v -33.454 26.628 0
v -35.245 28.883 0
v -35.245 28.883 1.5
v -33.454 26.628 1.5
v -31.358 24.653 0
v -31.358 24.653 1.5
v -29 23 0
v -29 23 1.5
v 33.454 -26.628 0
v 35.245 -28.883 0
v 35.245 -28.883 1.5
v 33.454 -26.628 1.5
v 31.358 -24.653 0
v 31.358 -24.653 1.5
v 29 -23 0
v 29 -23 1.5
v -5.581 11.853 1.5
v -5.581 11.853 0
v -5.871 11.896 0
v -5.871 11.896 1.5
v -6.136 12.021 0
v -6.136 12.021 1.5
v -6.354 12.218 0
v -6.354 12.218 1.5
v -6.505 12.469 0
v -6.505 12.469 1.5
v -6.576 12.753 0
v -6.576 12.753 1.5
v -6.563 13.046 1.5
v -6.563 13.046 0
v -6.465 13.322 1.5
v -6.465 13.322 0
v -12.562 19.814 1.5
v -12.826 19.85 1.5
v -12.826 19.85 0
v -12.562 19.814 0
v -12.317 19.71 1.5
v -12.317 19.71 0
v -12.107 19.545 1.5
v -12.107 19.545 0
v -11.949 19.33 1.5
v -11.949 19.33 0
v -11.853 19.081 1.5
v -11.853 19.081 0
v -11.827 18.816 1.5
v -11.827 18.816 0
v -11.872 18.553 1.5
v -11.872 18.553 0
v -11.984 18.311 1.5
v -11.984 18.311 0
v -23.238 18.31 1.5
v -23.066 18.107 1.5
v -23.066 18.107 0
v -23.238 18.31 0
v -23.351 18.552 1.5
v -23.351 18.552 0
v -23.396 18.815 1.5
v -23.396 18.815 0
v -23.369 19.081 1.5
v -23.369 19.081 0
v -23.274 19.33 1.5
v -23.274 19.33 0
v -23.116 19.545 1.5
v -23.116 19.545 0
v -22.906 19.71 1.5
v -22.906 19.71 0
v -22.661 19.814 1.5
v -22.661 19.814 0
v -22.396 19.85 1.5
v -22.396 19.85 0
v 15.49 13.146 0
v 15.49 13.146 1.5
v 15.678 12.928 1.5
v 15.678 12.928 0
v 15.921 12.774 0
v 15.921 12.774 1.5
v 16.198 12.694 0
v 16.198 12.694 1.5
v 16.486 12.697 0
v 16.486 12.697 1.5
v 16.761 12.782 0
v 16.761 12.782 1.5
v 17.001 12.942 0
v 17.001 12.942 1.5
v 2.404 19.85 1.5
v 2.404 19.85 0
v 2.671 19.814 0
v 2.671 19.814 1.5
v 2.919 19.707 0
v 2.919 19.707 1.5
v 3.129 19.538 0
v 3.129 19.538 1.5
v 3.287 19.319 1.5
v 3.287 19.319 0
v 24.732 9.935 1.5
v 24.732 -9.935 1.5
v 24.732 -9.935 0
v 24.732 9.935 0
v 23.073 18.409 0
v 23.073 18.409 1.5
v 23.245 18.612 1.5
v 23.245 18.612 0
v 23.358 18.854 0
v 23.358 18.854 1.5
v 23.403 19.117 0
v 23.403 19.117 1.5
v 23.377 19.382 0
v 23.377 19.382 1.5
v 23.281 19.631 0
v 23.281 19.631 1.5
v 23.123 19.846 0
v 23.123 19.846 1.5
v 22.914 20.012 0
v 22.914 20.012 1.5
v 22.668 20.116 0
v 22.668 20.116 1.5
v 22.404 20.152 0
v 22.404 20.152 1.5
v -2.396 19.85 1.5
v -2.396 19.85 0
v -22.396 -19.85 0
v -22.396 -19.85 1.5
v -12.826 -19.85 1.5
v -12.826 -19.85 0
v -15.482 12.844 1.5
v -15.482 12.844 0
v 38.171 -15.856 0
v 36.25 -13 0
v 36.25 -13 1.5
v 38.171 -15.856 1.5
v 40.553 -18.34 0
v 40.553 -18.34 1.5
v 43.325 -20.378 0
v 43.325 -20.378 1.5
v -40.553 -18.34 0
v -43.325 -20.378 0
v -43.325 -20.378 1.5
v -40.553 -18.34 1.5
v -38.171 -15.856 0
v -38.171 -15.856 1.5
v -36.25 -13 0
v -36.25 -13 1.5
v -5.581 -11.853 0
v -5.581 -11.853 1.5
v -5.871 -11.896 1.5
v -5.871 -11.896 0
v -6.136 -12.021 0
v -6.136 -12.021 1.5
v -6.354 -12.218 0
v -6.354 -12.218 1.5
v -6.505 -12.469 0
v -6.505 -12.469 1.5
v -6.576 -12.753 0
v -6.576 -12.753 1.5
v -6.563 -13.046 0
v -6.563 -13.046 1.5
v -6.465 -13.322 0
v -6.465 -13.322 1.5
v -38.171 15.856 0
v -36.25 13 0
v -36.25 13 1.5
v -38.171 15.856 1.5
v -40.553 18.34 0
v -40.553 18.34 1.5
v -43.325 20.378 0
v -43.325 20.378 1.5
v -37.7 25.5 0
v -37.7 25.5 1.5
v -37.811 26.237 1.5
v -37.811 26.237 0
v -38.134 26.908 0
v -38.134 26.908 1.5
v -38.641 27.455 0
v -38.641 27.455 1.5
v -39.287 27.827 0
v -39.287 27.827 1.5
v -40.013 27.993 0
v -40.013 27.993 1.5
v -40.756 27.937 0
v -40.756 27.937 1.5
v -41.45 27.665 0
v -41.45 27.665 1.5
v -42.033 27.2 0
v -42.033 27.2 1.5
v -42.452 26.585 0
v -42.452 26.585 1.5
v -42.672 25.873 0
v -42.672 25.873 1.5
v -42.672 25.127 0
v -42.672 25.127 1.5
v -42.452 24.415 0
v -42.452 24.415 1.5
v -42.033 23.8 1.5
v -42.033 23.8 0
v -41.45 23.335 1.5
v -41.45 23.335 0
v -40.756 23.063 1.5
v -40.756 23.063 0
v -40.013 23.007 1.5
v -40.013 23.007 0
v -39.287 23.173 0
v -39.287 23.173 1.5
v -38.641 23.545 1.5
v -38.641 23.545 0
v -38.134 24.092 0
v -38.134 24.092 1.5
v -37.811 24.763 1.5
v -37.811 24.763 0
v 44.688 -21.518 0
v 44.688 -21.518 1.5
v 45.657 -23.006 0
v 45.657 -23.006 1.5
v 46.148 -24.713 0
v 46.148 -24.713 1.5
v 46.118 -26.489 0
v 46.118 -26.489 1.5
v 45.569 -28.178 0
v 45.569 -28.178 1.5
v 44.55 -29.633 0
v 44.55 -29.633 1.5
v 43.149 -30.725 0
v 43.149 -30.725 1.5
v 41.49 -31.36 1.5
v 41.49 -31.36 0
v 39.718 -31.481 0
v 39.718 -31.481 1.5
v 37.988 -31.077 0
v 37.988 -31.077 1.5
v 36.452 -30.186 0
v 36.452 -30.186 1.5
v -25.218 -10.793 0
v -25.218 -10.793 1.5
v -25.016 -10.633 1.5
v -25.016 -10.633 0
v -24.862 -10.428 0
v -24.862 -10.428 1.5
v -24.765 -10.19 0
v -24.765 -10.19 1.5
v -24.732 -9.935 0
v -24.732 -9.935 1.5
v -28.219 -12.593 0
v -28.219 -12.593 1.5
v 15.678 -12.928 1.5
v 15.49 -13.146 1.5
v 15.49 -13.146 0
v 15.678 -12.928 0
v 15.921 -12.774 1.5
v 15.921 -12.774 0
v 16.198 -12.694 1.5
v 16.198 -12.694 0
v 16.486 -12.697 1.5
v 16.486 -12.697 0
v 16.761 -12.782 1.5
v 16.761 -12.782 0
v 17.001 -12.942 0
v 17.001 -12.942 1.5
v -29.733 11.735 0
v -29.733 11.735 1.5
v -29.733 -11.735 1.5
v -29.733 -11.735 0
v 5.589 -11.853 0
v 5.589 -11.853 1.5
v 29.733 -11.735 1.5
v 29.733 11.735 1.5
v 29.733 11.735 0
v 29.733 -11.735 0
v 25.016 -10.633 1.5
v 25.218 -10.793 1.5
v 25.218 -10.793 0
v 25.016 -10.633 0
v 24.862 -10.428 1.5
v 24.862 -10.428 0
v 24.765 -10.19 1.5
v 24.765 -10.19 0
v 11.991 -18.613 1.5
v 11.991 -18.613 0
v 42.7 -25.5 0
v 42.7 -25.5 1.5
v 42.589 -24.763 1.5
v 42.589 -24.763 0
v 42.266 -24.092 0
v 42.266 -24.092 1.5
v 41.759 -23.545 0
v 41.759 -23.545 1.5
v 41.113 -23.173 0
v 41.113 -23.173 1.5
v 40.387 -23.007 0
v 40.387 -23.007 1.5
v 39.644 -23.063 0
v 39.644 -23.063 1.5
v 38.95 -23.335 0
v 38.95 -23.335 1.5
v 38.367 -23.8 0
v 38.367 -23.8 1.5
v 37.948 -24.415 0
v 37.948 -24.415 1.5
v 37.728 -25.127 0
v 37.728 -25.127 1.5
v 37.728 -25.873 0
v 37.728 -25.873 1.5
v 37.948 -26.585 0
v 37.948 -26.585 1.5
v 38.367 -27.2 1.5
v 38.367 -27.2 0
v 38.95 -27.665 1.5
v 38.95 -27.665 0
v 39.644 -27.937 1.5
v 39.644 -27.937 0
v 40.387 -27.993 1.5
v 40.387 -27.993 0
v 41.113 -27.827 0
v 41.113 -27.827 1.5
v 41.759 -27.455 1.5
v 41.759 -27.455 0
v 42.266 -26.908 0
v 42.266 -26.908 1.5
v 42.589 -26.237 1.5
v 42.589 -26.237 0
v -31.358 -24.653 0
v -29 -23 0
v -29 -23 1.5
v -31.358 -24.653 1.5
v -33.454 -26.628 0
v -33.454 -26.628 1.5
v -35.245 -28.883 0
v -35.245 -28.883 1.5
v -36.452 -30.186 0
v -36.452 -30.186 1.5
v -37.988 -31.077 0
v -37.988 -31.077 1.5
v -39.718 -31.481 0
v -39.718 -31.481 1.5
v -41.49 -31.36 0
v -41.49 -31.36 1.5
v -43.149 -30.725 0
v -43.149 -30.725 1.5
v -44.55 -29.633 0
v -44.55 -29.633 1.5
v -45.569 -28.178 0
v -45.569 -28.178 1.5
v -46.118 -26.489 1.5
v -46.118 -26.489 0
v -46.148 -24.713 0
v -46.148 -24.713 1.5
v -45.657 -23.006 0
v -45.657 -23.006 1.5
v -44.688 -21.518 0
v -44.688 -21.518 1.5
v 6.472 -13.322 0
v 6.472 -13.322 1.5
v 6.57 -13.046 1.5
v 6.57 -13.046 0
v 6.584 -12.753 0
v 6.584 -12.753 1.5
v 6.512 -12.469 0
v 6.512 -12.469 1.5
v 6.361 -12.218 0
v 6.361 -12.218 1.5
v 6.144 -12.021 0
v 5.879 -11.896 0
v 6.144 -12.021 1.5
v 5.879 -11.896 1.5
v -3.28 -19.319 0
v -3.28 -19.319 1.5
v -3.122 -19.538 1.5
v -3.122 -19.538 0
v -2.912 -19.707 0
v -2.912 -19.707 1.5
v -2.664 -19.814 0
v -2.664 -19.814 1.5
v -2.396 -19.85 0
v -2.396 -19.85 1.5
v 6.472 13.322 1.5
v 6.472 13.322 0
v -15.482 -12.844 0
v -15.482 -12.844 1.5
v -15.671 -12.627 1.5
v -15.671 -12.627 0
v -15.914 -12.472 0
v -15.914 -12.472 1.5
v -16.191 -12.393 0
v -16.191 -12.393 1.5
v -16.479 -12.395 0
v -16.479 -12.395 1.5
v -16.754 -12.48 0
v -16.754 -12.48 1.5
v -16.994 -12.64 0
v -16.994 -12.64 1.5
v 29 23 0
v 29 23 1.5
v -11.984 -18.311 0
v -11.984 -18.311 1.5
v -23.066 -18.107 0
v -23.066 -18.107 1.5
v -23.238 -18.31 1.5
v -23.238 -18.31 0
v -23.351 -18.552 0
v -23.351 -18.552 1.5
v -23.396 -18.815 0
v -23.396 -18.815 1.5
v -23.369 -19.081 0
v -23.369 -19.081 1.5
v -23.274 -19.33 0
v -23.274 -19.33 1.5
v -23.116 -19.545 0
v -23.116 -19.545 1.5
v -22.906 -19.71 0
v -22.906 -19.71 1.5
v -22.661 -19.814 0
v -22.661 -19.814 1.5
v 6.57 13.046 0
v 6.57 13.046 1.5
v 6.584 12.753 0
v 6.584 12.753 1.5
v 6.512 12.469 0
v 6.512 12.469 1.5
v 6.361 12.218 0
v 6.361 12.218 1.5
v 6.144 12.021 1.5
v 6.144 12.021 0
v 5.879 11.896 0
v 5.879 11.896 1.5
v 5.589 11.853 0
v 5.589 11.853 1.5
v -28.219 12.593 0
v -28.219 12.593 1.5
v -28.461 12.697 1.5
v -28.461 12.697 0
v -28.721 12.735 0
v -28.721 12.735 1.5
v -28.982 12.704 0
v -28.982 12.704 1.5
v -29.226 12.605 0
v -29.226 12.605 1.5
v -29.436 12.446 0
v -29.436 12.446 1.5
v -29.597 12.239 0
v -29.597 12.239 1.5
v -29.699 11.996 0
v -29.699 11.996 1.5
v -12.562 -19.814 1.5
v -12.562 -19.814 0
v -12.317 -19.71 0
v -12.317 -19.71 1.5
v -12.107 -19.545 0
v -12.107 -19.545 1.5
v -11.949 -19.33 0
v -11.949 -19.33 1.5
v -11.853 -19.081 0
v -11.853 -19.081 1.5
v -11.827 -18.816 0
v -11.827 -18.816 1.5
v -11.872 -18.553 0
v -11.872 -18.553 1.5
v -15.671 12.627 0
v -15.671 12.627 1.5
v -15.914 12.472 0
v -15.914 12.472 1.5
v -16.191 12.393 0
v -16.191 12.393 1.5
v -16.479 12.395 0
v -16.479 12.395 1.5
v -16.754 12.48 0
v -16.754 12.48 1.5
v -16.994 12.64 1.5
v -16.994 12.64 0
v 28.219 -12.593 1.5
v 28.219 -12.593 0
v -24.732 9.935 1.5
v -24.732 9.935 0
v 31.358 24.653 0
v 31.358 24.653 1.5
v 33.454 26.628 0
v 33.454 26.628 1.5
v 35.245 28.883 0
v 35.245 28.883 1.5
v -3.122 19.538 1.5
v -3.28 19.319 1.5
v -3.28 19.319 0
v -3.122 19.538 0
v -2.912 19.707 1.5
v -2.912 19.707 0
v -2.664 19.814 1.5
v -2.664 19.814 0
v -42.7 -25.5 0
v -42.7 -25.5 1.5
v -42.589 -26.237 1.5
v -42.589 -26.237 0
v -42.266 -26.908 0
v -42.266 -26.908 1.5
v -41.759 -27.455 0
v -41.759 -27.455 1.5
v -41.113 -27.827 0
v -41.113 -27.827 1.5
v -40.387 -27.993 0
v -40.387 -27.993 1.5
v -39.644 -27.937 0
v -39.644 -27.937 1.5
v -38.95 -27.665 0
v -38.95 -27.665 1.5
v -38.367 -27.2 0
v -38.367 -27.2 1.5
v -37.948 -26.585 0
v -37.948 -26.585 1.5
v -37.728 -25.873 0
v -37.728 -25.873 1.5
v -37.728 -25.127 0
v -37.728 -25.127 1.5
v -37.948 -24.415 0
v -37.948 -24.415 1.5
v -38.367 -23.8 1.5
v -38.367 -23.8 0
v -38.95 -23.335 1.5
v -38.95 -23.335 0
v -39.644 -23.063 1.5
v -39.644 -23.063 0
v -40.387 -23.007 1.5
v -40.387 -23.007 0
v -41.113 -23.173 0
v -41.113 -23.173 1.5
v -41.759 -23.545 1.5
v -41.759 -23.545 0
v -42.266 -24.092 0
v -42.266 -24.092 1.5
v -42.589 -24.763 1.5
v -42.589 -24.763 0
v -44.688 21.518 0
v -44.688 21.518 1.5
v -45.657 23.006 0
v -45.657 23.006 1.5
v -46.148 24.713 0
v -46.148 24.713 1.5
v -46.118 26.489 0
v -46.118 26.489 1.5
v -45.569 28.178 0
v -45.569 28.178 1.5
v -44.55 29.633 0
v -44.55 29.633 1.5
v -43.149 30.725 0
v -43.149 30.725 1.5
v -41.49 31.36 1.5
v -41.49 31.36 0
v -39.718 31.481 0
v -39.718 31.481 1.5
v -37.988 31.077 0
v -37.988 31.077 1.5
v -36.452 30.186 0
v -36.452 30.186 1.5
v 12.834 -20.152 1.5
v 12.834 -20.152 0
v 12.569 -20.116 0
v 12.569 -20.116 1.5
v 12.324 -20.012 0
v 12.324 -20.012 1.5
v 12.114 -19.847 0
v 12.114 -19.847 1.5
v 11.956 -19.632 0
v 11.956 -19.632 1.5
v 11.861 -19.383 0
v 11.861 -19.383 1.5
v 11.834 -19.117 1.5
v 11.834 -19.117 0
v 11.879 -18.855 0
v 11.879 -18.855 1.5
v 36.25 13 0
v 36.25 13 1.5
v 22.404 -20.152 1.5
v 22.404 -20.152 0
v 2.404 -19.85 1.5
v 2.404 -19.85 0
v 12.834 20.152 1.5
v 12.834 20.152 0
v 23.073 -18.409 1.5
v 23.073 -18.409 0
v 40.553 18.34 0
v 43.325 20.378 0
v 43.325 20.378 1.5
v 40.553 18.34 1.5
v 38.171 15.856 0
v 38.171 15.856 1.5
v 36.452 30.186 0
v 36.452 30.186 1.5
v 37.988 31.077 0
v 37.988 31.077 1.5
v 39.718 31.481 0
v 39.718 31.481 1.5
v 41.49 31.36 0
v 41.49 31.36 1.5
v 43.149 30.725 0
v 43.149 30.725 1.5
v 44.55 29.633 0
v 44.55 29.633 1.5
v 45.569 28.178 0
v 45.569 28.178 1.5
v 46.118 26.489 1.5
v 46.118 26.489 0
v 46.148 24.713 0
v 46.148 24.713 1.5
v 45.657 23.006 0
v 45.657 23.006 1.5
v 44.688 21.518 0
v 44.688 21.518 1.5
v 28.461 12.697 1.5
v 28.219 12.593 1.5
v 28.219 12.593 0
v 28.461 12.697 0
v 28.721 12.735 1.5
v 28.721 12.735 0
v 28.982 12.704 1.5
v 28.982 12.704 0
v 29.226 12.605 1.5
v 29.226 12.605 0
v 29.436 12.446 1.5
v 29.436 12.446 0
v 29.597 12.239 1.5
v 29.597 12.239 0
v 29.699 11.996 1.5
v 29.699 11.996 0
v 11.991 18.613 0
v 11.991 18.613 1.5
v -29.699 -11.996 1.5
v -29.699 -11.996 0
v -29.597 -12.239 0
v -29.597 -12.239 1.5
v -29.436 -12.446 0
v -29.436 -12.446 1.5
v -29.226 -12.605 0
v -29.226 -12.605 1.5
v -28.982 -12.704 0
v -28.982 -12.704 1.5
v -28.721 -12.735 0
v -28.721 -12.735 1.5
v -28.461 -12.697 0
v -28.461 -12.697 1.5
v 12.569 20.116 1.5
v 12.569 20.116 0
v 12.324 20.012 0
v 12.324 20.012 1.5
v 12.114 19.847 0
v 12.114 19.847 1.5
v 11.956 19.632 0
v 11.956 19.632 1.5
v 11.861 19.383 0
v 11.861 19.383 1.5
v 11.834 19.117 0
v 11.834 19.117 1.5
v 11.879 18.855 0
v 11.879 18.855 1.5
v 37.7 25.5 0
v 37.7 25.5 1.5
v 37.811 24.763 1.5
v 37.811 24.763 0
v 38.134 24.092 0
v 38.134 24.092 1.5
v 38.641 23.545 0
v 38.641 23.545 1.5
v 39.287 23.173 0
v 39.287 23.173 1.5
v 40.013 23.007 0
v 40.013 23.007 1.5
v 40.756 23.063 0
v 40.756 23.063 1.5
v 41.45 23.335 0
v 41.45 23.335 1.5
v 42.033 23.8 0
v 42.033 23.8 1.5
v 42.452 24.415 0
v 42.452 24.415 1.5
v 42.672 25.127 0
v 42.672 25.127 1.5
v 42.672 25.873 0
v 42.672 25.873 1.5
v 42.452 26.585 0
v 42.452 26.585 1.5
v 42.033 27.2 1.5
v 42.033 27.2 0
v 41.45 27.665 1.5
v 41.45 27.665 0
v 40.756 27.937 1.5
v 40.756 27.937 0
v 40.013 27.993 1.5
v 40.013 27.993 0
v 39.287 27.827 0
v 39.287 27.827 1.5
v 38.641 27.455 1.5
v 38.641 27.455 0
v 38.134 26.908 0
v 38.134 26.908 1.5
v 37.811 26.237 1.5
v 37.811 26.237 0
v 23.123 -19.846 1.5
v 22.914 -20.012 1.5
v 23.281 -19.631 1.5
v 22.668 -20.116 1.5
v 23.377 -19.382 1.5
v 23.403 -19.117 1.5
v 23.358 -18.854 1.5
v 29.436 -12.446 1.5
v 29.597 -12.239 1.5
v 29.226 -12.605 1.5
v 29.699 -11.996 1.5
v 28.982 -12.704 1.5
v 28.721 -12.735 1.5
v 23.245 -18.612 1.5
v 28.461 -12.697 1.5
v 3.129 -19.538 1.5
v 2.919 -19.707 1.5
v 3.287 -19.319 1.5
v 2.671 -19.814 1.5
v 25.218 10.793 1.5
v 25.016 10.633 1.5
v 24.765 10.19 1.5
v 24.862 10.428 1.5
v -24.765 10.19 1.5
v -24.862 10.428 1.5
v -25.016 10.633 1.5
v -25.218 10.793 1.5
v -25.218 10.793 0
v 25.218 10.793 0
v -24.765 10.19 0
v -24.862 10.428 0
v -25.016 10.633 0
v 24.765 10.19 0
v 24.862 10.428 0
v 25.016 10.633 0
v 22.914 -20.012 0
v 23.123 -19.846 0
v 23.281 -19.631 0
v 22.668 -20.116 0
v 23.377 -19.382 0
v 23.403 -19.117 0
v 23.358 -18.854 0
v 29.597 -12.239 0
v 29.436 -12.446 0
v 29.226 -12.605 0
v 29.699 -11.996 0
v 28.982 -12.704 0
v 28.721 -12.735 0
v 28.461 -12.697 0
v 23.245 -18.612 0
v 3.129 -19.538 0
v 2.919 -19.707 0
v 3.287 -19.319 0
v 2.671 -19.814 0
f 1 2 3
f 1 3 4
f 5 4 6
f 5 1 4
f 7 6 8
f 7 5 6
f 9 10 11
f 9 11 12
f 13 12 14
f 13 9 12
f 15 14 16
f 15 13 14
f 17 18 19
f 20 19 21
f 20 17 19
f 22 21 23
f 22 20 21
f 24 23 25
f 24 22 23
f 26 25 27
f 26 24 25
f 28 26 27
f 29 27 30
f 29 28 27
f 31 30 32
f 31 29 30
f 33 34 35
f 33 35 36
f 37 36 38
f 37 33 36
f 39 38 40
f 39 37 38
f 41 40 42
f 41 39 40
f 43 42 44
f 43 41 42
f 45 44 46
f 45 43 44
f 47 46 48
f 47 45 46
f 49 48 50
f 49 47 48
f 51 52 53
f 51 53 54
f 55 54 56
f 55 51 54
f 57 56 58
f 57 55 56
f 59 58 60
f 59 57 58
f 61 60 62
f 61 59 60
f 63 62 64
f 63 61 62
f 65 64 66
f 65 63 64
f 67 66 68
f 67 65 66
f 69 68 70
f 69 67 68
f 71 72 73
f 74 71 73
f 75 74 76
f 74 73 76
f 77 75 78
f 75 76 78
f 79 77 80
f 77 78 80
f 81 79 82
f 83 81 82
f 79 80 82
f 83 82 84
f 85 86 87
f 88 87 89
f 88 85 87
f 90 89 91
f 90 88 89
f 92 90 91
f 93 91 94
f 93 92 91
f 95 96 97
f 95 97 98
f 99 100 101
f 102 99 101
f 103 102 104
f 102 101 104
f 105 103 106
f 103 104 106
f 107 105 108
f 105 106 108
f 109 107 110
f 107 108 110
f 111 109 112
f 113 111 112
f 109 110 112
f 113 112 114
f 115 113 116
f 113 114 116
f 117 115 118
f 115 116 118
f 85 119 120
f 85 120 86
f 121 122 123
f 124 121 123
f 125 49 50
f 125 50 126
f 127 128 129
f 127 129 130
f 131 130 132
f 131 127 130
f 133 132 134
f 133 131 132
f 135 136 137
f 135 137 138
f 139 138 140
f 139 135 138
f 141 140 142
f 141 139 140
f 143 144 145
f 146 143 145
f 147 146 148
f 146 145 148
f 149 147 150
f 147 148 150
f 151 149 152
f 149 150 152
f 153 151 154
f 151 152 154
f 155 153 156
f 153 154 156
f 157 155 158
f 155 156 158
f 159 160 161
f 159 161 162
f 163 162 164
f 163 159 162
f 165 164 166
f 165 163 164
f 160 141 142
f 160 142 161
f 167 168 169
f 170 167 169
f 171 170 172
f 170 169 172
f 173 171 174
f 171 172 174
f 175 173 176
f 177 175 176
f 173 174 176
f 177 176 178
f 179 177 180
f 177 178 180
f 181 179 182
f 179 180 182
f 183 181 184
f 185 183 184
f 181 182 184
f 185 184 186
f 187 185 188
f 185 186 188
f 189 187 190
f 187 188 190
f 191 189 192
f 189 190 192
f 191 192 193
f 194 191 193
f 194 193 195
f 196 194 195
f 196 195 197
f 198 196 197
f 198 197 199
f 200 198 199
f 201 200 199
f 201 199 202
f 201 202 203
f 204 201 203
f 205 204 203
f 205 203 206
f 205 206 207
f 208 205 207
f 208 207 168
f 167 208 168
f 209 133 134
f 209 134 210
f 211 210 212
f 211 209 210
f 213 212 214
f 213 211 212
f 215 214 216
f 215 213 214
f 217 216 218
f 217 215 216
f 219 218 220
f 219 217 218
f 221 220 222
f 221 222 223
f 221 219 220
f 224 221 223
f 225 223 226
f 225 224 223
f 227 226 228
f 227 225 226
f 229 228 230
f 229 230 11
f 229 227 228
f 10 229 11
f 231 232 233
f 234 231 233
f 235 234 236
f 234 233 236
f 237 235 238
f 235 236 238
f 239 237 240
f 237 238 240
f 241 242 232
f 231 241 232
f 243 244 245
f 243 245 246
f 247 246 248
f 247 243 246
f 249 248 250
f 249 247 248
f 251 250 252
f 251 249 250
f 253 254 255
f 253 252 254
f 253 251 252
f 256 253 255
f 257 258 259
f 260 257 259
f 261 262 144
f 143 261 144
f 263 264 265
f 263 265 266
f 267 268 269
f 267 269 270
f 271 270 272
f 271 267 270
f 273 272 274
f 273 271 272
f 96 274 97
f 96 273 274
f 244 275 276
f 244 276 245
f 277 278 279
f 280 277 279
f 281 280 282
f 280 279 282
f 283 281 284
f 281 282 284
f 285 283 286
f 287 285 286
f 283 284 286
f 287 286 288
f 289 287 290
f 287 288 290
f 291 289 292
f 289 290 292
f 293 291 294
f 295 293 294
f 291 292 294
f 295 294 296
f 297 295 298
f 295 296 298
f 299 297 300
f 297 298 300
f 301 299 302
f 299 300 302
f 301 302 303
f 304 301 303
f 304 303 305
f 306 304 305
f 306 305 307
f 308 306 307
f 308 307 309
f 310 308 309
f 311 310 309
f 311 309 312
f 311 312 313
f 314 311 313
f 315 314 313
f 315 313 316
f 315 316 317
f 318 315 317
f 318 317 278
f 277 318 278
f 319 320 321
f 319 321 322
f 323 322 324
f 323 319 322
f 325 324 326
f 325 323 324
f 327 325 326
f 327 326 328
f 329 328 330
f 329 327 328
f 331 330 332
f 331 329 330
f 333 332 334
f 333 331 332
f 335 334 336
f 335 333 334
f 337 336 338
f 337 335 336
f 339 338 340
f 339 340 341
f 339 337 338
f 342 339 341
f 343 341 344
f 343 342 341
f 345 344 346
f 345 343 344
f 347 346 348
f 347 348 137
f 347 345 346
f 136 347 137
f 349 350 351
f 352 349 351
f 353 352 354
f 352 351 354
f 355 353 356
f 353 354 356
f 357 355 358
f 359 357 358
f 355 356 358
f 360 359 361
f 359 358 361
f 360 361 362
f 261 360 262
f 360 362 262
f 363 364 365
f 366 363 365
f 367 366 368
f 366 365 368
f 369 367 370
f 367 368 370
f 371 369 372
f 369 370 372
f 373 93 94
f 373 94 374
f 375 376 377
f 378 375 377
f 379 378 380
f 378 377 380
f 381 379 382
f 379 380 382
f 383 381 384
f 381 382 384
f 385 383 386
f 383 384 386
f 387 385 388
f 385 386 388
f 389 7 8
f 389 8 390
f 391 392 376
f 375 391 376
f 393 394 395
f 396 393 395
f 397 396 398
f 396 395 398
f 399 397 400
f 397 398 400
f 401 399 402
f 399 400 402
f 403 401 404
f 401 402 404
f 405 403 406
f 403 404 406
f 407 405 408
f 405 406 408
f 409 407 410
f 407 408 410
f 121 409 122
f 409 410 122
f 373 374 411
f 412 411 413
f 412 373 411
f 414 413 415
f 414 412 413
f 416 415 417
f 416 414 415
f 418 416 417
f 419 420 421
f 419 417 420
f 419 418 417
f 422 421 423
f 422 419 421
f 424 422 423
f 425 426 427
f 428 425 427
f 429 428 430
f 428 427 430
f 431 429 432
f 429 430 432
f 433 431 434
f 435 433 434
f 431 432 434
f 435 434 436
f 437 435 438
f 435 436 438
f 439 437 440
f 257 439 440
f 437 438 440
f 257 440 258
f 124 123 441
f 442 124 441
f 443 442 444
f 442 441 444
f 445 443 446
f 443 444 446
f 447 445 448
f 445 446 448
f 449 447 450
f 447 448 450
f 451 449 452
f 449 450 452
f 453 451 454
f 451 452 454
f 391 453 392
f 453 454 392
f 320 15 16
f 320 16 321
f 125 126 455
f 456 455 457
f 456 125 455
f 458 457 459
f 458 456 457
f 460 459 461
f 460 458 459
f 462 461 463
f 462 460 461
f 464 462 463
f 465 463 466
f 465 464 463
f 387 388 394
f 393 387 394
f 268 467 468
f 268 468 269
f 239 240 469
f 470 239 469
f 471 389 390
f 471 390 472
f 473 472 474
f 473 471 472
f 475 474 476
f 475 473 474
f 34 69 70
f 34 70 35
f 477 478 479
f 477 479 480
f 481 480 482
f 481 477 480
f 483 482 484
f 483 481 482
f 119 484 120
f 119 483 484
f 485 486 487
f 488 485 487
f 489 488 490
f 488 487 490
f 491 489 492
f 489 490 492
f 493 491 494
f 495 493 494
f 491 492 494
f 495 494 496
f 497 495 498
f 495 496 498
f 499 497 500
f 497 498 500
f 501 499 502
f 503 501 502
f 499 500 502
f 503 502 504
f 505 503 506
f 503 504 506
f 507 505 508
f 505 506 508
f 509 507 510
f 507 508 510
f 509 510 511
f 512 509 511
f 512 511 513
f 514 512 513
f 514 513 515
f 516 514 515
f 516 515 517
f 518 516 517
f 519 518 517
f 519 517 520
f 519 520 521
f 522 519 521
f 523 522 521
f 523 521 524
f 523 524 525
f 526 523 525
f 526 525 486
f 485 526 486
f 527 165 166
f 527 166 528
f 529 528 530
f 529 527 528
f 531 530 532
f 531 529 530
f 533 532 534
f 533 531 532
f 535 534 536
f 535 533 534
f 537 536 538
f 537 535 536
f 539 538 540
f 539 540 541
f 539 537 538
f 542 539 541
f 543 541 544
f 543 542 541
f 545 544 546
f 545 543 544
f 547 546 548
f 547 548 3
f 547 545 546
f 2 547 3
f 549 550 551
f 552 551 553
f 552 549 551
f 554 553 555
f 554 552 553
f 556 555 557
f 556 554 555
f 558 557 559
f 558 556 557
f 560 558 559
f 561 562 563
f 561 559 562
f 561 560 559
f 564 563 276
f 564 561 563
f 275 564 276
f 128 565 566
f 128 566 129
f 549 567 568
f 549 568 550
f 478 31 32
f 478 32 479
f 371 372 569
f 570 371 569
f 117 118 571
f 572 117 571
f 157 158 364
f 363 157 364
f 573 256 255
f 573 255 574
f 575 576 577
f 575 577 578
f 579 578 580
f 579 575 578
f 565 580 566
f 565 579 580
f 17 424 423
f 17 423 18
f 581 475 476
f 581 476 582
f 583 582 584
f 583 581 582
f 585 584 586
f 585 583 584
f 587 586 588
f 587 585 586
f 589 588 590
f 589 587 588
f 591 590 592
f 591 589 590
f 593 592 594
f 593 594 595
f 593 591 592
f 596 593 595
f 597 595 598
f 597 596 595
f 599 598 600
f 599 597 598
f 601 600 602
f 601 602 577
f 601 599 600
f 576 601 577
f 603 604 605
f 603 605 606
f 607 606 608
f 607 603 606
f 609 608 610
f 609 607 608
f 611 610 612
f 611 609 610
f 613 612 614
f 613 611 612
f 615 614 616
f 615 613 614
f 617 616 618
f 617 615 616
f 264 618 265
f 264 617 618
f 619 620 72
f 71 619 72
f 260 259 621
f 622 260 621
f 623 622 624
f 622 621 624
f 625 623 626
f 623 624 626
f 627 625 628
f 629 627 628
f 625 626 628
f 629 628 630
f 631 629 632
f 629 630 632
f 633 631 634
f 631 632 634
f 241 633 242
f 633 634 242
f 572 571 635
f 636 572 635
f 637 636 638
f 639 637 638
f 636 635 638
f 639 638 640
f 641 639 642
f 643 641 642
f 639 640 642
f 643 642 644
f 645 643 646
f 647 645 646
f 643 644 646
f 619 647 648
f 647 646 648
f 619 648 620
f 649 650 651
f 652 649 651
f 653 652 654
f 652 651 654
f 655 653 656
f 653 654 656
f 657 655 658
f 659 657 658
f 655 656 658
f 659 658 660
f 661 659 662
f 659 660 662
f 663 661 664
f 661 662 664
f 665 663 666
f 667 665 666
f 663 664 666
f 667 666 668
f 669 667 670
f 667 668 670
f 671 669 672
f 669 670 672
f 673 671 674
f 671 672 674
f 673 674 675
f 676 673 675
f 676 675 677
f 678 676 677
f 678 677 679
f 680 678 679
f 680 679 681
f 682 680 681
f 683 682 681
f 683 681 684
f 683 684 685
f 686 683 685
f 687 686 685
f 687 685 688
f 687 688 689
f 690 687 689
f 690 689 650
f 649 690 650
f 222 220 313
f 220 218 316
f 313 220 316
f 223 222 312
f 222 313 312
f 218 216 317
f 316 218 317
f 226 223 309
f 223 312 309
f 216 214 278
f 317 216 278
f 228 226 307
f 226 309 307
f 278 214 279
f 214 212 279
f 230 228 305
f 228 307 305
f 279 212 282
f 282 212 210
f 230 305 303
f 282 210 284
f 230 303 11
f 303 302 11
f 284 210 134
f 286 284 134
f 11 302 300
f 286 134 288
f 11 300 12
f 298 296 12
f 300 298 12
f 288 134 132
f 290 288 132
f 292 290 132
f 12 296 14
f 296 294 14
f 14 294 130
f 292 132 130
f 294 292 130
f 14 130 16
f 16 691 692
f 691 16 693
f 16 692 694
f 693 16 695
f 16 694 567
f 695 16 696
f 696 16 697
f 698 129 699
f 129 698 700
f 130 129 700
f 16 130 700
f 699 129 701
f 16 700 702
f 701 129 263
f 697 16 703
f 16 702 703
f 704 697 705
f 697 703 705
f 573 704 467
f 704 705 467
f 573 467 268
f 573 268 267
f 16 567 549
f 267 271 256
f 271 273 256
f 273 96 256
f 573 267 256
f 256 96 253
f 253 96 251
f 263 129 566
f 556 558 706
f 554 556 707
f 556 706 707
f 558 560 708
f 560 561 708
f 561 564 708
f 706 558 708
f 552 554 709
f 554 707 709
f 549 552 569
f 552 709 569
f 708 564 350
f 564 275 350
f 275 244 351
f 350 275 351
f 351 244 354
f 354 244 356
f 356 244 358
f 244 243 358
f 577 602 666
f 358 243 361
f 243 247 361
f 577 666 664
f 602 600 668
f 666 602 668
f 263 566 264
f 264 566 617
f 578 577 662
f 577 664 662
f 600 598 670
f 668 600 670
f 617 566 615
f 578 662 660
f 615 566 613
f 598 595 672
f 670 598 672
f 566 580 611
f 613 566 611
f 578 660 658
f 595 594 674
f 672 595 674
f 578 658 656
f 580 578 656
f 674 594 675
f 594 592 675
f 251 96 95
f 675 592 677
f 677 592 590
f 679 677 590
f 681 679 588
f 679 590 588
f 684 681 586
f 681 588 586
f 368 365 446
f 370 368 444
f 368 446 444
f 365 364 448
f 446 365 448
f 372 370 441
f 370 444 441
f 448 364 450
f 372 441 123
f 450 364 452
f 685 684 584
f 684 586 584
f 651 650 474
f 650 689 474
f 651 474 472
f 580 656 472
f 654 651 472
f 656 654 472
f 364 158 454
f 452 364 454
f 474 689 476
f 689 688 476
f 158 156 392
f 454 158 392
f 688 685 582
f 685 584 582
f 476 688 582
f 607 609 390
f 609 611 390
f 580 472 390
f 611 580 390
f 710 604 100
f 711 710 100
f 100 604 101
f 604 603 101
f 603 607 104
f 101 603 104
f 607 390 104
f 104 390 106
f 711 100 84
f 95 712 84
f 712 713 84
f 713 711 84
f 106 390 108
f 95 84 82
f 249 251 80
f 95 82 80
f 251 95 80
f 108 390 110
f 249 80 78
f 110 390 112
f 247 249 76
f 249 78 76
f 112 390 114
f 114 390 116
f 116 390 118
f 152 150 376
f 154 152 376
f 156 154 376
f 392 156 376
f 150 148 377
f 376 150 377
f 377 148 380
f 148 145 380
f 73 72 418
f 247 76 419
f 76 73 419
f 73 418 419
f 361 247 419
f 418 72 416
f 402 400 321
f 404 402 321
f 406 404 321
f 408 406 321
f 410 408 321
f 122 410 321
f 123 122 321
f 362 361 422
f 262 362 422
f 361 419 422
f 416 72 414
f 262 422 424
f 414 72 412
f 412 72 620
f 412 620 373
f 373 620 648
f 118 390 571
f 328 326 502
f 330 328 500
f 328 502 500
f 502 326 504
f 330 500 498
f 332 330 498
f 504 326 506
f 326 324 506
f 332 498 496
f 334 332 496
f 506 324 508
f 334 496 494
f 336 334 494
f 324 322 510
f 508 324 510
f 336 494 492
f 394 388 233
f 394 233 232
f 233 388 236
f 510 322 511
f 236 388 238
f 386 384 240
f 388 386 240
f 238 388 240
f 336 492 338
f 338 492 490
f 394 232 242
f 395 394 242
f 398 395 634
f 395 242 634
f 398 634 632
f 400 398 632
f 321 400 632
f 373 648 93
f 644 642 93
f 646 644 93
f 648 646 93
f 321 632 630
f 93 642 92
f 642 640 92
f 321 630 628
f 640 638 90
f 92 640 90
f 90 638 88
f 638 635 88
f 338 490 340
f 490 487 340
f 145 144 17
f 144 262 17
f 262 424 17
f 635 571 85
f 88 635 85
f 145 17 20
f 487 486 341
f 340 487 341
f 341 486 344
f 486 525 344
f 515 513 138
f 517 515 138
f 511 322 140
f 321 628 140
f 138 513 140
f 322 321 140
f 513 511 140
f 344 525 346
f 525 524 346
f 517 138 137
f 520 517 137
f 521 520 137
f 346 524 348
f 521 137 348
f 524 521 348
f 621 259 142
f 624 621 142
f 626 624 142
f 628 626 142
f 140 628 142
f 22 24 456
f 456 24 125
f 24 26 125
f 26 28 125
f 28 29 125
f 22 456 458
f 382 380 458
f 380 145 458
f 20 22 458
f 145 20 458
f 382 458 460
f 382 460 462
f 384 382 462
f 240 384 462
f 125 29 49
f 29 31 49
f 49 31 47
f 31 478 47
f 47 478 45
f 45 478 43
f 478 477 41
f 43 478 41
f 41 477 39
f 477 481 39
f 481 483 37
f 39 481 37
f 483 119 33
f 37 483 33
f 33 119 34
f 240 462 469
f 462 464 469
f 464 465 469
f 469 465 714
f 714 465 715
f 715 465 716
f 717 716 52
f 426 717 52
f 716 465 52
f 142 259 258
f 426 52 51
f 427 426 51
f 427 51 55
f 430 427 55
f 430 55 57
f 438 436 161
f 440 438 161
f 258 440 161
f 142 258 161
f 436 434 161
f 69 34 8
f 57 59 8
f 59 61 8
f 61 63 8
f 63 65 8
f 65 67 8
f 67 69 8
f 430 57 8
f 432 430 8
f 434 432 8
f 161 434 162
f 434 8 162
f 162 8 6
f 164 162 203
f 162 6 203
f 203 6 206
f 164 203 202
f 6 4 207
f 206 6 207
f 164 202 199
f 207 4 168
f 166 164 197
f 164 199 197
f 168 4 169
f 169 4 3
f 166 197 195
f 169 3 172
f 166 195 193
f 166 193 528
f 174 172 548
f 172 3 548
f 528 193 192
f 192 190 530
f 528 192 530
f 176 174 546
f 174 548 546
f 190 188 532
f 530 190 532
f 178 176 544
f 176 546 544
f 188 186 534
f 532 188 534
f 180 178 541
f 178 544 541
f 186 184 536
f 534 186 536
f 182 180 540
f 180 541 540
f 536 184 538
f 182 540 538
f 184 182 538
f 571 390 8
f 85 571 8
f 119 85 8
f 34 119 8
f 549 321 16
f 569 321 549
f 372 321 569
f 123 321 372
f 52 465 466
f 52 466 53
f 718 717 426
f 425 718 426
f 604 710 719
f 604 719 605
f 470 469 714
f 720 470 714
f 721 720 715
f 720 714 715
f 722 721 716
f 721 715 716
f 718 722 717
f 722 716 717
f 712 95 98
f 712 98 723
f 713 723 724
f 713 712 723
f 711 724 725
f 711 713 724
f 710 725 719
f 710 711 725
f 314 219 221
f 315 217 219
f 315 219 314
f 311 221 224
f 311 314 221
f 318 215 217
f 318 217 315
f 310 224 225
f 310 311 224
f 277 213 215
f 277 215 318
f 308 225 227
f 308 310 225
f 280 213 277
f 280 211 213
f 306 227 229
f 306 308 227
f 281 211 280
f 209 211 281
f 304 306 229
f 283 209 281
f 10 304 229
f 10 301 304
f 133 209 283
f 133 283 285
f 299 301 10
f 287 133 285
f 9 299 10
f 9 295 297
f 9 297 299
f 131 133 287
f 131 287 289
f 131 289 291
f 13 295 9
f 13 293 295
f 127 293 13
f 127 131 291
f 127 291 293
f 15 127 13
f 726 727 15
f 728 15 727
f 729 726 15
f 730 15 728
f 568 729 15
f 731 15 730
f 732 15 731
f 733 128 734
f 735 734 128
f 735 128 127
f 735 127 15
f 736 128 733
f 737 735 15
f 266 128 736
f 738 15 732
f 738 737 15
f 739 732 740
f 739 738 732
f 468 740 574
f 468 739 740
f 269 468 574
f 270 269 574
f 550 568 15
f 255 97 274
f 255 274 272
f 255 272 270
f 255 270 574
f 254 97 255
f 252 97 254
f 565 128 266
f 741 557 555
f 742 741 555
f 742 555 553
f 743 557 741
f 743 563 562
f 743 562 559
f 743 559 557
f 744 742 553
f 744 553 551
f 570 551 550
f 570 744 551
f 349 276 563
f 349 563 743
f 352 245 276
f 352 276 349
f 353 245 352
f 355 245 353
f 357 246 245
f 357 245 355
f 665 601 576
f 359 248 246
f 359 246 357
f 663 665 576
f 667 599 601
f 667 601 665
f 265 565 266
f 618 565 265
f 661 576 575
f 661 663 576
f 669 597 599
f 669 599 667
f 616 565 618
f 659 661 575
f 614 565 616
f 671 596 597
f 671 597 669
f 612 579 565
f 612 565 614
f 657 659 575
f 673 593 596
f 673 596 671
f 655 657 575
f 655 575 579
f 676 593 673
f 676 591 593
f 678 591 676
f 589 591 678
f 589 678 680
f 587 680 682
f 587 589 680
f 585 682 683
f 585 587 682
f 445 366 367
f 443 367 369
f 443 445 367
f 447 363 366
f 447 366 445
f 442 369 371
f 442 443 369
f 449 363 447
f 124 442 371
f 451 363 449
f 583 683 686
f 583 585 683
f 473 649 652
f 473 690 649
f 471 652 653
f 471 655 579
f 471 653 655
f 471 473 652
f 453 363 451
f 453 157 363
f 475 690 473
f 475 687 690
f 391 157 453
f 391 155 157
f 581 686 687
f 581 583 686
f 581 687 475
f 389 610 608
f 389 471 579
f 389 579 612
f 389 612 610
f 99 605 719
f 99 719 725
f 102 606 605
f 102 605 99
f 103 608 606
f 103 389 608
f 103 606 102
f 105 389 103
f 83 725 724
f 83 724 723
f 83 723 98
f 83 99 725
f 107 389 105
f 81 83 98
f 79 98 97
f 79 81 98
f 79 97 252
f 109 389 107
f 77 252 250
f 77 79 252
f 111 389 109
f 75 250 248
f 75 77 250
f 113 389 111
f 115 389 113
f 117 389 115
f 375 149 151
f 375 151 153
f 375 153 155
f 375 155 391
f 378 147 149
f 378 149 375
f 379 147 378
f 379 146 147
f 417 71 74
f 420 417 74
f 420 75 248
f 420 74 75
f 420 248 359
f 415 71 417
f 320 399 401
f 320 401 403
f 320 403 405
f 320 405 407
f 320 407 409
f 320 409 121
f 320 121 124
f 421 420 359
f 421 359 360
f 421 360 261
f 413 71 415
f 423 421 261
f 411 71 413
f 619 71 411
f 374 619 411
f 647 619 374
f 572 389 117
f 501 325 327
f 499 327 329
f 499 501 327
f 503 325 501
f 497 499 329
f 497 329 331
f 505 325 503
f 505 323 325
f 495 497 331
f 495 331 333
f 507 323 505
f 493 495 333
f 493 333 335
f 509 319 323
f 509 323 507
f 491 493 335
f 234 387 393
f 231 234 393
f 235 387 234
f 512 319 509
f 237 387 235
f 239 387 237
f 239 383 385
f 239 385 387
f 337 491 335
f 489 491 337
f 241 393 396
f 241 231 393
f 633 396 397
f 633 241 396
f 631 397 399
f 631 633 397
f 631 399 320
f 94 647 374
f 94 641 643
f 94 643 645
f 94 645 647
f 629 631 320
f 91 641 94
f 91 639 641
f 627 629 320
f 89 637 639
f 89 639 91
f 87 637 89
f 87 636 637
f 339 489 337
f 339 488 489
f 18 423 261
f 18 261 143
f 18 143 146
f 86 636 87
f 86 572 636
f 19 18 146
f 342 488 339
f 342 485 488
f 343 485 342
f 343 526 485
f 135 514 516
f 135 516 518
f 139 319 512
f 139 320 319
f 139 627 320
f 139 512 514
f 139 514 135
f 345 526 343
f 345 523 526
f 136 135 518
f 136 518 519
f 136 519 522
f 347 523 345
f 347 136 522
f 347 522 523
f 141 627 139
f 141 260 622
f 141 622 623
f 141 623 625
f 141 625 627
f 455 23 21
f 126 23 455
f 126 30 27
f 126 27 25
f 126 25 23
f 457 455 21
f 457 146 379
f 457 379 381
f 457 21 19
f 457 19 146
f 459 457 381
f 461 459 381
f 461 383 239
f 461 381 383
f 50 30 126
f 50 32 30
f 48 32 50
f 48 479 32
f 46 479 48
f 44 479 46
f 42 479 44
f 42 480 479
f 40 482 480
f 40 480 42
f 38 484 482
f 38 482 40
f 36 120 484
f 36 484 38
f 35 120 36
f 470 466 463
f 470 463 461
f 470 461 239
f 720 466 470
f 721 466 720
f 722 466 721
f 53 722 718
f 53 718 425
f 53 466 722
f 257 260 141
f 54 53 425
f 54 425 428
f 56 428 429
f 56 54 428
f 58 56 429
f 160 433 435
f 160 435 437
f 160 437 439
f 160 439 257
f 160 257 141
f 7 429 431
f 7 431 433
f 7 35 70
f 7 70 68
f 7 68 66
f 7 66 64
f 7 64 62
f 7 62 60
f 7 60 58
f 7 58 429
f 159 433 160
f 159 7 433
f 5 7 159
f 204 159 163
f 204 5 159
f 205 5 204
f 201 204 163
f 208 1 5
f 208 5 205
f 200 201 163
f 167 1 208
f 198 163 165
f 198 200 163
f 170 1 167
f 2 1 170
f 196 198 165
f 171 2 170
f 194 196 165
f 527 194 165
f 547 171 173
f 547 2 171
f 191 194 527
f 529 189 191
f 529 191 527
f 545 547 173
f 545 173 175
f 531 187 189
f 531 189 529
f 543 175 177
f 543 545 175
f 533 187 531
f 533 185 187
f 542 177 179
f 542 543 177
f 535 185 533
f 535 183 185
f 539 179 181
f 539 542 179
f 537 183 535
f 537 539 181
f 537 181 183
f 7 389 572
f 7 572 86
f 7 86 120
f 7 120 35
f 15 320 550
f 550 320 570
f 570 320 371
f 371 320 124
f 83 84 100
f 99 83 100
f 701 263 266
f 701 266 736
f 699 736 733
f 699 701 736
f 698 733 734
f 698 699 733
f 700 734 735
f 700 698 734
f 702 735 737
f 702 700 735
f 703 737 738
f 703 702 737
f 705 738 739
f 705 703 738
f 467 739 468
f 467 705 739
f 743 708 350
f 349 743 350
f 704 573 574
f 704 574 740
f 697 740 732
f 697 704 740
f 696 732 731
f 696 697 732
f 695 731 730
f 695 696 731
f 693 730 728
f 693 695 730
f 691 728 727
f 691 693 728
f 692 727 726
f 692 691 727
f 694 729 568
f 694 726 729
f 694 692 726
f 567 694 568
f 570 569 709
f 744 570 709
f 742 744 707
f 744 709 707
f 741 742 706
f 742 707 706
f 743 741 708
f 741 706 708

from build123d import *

# Parameters (mm, degrees)
BOSS_EXTRUDE1_DEPTH = 1.5
SKETCH2_R           = 2.5
CUT_EXTRUDE1_DEPTH  = 56.936928768


with BuildPart() as part:
    # Sketch1 → Boss-Extrude1 (new body)
    with BuildSketch(Plane.XY):
        with BuildLine():
            Line((-36.25, -13), (-36.25, 13))
            ThreePointArc((-36.25, 13), (-39.308359466, 17.14885926), (-43.325461287, 20.378331156))
            ThreePointArc((-43.325461287, 20.378331156), (-44.549693467, 29.632815837), (-35.244739735, 28.883104448))
            ThreePointArc((-35.244739735, 28.883104448), (-32.441546823, 25.602755414), (-29, 23))
            Line((-29, 23), (29, 23))
            ThreePointArc((29, 23), (32.441546823, 25.602755414), (35.244739735, 28.883104448))
            ThreePointArc((35.244739735, 28.883104448), (44.549693467, 29.632815837), (43.325461287, 20.378331156))
            ThreePointArc((43.325461287, 20.378331156), (39.308359466, 17.14885926), (36.25, 13))
            Line((36.25, 13), (36.25, -13))
            ThreePointArc((36.25, -13), (39.308359466, -17.14885926), (43.325461287, -20.378331156))
            ThreePointArc((43.325461287, -20.378331156), (44.549693467, -29.632815837), (35.244739735, -28.883104448))
            ThreePointArc((35.244739735, -28.883104448), (32.441546823, -25.602755414), (29, -23))
            Line((29, -23), (-29, -23))
            ThreePointArc((-29, -23), (-32.441546823, -25.602755414), (-35.244739735, -28.883104448))
            ThreePointArc((-35.244739735, -28.883104448), (-44.549693467, -29.632815837), (-43.325461287, -20.378331156))
            ThreePointArc((-43.325461287, -20.378331156), (-39.308359466, -17.14885926), (-36.25, -13))
        make_face()
    extrude(amount=BOSS_EXTRUDE1_DEPTH)

    # Sketch2 → Cut-Extrude1 (cut, through all)
    with BuildSketch(Plane.XY.offset(1.5)):
        with Locations((-40.2, 25.5)):
            Circle(SKETCH2_R)
        with Locations(Location((-40.2, -25.5, 0), (0, 0, 180))):
            Circle(SKETCH2_R)
        with Locations((40.2, -25.5)):
            Circle(SKETCH2_R)
        with Locations(Location((40.2, 25.5, 0), (0, 0, 180))):
            Circle(SKETCH2_R)
        with BuildLine():
            Line((-22.396410464, 19.85), (-12.826410464, 19.85))
            ThreePointArc((-12.826410464, 19.85), (-11.949193754, 19.33009462), (-11.984116418, 18.310981689))
            Line((-11.984116418, 18.310981689), (-15.482345258, 12.844493329))
            ThreePointArc((-15.482345258, 12.844493329), (-16.190773525, 12.392512169), (-16.993732126, 12.640332796))
            Line((-16.993732126, 12.640332796), (-23.065503286, 18.106821155))
            ThreePointArc((-23.065503286, 18.106821155), (-23.33, 19.208344217), (-22.396410464, 19.85))
        make_face()
        with BuildLine():
            Line((-29.733467607, 11.735), (-29.733467607, -11.735))
            ThreePointArc((-29.733467607, -11.735), (-29.226272987, -12.605139562), (-28.219181892, -12.592618915))
            Line((-28.219181892, -12.592618915), (-25.217515688, -10.792618915))
            ThreePointArc((-25.217515688, -10.792618915), (-24.861661841, -10.42780538), (-24.731801403, -9.935))
            Line((-24.731801403, -9.935), (-24.731801403, 9.935))
            ThreePointArc((-24.731801403, 9.935), (-24.861661841, 10.42780538), (-25.217515688, 10.792618915))
            Line((-25.217515688, 10.792618915), (-28.219181892, 12.592618915))
            ThreePointArc((-28.219181892, 12.592618915), (-29.226272987, 12.605139562), (-29.733467607, 11.735))
        make_face()
        with BuildLine():
            Line((-2.396410464, 19.85), (2.403589536, 19.85))
            ThreePointArc((2.403589536, 19.85), (2.918821443, 19.707050805), (3.286749377, 19.319072165))
            Line((3.286749377, 19.319072165), (6.471749377, 13.322416847))
            ThreePointArc((6.471749377, 13.322416847), (6.445640341, 12.338112776), (5.588589536, 11.853344682))
            Line((5.588589536, 11.853344682), (-5.581410464, 11.853344682))
            ThreePointArc((-5.581410464, 11.853344682), (-6.438461269, 12.338112776), (-6.464570304, 13.322416847))
            Line((-6.464570304, 13.322416847), (-3.279570304, 19.319072165))
            ThreePointArc((-3.279570304, 19.319072165), (-2.91164237, 19.707050805), (-2.396410464, 19.85))
        make_face()
        with BuildLine():
            Line((22.403589536, 20.151728768), (12.833589536, 20.151728768))
            ThreePointArc((12.833589536, 20.151728768), (11.956372827, 19.631823388), (11.99129549, 18.612710457))
            Line((11.99129549, 18.612710457), (15.48952433, 13.146222097))
            ThreePointArc((15.48952433, 13.146222097), (16.197952597, 12.694240937), (17.000911199, 12.942061564))
            Line((17.000911199, 12.942061564), (23.072682359, 18.408549924))
            ThreePointArc((23.072682359, 18.408549924), (23.337179073, 19.510072985), (22.403589536, 20.151728768))
        make_face()
        with BuildLine():
            Line((17.000911199, -12.942061564), (23.072682359, -18.408549924))
            ThreePointArc((23.072682359, -18.408549924), (23.337179073, -19.510072985), (22.403589536, -20.151728768))
            Line((22.403589536, -20.151728768), (12.833589536, -20.151728768))
            ThreePointArc((12.833589536, -20.151728768), (11.956372827, -19.631823388), (11.99129549, -18.612710457))
            Line((11.99129549, -18.612710457), (15.48952433, -13.146222097))
            ThreePointArc((15.48952433, -13.146222097), (16.197952597, -12.694240937), (17.000911199, -12.942061564))
        make_face()
        with BuildLine():
            Line((-6.464570304, -13.322416847), (-3.279570304, -19.319072165))
            ThreePointArc((-3.279570304, -19.319072165), (-2.91164237, -19.707050805), (-2.396410464, -19.85))
            Line((-2.396410464, -19.85), (2.403589536, -19.85))
            ThreePointArc((2.403589536, -19.85), (2.918821443, -19.707050805), (3.286749377, -19.319072165))
            Line((3.286749377, -19.319072165), (6.471749377, -13.322416847))
            ThreePointArc((6.471749377, -13.322416847), (6.445640341, -12.338112776), (5.588589536, -11.853344682))
            Line((5.588589536, -11.853344682), (-5.581410464, -11.853344682))
            ThreePointArc((-5.581410464, -11.853344682), (-6.438461269, -12.338112776), (-6.464570304, -13.322416847))
        make_face()
        with BuildLine():
            Line((-16.993732126, -12.640332796), (-23.065503286, -18.106821155))
            ThreePointArc((-23.065503286, -18.106821155), (-23.33, -19.208344217), (-22.396410464, -19.85))
            Line((-22.396410464, -19.85), (-12.826410464, -19.85))
            ThreePointArc((-12.826410464, -19.85), (-11.949193754, -19.33009462), (-11.984116418, -18.310981689))
            Line((-11.984116418, -18.310981689), (-15.482345258, -12.844493329))
            ThreePointArc((-15.482345258, -12.844493329), (-16.190773525, -12.392512169), (-16.993732126, -12.640332796))
        make_face()
        with BuildLine():
            Line((25.217515688, 10.792618915), (28.219181892, 12.592618915))
            ThreePointArc((28.219181892, 12.592618915), (29.226272987, 12.605139562), (29.733467607, 11.735))
            Line((29.733467607, 11.735), (29.733467607, -11.735))
            ThreePointArc((29.733467607, -11.735), (29.226272987, -12.605139562), (28.219181892, -12.592618915))
            Line((28.219181892, -12.592618915), (25.217515688, -10.792618915))
            ThreePointArc((25.217515688, -10.792618915), (24.861661841, -10.42780538), (24.731801403, -9.935))
            Line((24.731801403, -9.935), (24.731801403, 9.935))
            ThreePointArc((24.731801403, 9.935), (24.861661841, 10.42780538), (25.217515688, 10.792618915))
        make_face()
    extrude(amount=-CUT_EXTRUDE1_DEPTH, mode=Mode.SUBTRACT)


solid = part.part
